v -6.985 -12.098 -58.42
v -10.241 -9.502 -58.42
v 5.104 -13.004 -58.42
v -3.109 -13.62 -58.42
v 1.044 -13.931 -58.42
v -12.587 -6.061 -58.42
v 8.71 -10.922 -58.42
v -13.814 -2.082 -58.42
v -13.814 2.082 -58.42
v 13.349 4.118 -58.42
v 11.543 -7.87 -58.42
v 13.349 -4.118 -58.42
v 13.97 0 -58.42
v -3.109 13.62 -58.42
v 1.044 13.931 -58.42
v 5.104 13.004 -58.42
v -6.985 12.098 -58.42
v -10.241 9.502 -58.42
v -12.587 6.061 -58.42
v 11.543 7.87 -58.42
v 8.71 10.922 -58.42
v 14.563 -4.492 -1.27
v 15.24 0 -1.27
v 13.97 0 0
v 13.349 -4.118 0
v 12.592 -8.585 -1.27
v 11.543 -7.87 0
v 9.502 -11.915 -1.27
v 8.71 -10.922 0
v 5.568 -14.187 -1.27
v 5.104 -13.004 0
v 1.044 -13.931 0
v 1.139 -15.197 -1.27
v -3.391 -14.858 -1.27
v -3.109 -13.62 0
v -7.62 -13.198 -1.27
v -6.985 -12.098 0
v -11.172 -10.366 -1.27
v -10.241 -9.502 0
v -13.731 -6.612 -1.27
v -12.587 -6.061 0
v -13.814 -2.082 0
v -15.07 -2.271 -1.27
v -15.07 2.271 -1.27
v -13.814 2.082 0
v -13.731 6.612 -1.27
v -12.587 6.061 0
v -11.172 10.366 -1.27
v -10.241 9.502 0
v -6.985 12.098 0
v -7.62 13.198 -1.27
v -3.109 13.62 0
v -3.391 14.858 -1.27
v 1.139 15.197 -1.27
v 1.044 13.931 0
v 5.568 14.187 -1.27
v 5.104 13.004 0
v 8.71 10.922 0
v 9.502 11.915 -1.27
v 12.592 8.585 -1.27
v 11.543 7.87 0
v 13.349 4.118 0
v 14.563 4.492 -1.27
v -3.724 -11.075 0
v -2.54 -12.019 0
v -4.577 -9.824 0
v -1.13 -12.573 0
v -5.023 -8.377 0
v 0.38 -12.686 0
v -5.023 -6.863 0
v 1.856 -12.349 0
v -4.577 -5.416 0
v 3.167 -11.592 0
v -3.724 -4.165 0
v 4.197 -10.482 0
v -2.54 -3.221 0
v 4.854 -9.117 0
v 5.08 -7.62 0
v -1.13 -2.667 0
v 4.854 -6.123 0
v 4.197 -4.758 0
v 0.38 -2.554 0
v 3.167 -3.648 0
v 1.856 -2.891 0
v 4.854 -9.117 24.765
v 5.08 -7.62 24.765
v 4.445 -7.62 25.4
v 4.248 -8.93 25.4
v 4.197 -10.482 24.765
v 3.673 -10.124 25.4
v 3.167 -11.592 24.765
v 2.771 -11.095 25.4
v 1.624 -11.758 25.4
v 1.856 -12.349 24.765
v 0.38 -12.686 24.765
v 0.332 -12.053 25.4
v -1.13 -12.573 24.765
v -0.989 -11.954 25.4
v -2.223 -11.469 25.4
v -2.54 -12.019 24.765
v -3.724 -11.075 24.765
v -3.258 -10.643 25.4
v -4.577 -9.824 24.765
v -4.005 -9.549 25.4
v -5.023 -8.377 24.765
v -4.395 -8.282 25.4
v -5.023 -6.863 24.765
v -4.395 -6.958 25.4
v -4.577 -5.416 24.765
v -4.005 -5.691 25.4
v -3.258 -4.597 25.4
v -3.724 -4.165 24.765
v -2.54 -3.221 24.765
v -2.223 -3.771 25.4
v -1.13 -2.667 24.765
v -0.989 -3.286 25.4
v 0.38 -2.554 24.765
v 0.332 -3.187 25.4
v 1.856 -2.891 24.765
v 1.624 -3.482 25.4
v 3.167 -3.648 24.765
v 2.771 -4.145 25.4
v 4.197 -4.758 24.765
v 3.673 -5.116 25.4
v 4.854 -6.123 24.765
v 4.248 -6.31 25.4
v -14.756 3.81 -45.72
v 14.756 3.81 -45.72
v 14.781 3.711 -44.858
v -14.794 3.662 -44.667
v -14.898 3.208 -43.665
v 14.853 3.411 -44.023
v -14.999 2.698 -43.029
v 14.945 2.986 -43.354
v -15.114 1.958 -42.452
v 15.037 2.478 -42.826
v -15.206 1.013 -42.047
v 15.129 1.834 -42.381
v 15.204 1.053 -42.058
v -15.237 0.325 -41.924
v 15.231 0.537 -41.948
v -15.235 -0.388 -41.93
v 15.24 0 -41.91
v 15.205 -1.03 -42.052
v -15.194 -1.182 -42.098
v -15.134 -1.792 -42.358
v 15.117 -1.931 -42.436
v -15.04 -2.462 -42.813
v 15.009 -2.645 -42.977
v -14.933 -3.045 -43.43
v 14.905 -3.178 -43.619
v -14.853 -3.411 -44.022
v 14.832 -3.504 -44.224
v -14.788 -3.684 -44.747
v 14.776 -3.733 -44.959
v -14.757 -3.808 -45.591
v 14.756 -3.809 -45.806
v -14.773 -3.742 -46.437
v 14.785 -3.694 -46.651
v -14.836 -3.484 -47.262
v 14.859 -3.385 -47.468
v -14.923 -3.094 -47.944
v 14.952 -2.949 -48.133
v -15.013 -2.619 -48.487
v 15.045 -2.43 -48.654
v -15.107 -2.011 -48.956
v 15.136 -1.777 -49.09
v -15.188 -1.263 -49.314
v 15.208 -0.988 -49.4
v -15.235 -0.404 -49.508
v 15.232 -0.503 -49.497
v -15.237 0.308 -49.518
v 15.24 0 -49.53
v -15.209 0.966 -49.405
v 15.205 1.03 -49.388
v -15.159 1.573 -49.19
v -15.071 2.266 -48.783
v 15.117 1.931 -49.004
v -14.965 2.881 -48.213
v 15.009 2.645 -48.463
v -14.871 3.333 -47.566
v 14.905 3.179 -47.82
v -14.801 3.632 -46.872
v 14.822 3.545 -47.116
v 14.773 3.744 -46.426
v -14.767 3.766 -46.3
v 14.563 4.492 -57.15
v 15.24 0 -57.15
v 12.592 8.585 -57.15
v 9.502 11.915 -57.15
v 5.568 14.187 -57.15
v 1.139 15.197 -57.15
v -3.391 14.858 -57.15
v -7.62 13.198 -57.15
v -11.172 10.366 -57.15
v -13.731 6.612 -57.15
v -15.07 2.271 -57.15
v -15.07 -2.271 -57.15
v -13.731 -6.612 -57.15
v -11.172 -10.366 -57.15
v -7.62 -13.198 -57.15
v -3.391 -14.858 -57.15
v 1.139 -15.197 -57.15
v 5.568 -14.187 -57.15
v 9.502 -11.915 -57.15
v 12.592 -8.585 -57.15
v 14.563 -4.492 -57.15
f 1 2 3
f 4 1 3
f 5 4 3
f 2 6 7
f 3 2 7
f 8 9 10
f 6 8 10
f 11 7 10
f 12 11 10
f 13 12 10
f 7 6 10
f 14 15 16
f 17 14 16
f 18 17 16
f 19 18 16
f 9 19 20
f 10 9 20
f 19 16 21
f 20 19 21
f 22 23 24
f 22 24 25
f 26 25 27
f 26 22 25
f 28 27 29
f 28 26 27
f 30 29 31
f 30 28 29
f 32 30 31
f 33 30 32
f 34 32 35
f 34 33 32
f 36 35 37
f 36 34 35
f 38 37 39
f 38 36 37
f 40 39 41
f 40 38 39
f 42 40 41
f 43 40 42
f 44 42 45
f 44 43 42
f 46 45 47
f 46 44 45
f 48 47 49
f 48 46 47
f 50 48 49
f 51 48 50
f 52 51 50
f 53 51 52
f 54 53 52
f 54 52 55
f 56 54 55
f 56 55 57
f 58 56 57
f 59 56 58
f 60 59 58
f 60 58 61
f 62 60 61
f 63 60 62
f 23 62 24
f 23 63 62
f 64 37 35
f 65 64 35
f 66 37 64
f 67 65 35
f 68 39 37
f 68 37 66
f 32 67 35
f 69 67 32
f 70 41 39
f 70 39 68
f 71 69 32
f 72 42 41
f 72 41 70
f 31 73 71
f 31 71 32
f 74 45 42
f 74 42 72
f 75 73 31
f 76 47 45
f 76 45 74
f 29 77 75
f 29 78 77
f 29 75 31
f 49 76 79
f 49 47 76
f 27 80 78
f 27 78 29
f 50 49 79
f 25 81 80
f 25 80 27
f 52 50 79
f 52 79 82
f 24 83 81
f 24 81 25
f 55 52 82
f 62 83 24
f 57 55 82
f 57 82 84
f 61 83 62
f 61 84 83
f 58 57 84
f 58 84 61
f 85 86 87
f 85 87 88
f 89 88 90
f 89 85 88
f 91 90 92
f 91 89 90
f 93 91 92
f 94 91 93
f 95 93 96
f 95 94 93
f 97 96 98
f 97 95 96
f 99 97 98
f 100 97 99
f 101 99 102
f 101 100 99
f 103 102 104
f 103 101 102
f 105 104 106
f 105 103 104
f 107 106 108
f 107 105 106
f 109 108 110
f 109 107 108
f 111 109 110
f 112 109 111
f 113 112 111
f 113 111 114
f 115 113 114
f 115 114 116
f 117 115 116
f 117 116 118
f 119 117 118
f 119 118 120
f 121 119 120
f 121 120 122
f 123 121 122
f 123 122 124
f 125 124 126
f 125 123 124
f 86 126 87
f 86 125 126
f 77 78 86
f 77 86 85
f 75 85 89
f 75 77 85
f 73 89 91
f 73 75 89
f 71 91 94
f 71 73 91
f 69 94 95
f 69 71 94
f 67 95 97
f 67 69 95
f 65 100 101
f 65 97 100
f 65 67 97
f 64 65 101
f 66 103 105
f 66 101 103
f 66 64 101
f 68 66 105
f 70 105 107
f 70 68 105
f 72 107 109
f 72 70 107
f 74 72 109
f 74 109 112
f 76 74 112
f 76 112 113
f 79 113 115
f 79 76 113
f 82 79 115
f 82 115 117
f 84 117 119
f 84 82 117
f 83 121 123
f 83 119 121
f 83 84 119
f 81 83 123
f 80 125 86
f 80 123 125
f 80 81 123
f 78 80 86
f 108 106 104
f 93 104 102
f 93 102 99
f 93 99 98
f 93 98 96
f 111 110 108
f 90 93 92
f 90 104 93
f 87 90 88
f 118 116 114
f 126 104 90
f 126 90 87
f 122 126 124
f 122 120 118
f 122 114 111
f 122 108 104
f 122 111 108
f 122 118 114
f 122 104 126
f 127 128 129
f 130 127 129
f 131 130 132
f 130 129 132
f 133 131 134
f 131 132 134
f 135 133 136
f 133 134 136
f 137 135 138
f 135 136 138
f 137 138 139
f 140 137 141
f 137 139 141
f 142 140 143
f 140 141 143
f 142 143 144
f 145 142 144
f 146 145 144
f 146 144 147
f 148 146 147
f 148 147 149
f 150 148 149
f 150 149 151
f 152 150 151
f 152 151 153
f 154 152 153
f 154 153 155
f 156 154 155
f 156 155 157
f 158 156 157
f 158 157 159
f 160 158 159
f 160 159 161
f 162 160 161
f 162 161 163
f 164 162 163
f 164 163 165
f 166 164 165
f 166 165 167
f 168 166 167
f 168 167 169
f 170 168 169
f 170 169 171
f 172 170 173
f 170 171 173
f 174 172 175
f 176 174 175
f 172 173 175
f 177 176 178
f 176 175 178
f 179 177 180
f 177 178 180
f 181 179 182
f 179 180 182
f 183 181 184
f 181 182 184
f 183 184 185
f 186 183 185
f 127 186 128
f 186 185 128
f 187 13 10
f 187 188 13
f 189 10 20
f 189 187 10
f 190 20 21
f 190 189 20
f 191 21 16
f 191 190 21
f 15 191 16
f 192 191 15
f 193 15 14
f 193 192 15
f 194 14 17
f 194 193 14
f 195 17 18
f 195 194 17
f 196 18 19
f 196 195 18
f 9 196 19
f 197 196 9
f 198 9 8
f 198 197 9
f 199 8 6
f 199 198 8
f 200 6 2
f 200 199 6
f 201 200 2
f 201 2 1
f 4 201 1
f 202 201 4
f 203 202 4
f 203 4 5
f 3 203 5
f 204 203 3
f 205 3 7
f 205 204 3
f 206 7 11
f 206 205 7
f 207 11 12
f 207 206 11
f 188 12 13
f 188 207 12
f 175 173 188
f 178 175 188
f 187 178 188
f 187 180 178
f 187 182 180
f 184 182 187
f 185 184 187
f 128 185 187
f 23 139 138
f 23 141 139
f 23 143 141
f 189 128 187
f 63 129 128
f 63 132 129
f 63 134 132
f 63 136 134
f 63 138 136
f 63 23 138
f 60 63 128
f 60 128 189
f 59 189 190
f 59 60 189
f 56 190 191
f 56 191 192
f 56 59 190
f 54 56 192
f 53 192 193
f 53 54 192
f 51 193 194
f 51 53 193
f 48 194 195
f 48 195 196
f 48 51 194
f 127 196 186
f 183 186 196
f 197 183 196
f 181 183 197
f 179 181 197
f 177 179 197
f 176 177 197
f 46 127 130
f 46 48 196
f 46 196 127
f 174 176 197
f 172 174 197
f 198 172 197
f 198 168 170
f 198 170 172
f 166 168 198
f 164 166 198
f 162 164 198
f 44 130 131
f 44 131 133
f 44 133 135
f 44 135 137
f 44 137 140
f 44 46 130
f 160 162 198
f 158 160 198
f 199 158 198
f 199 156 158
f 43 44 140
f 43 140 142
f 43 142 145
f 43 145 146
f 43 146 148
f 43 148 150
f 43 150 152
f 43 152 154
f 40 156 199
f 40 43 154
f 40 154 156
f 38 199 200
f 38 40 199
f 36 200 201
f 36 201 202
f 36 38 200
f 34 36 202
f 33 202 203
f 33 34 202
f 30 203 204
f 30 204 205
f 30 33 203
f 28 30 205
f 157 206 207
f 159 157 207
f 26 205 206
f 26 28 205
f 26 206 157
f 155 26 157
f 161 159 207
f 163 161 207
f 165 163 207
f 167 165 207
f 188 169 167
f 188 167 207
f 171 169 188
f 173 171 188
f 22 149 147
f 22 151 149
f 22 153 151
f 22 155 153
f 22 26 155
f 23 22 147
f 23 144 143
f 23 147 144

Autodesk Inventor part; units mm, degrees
ref_plane "YZ Plane" through (0, 0, 0) normal (1, 0, 0) x (0, 1, 0)
ref_plane "XZ Plane" through (0, 0, 0) normal (0, 1, 0) x (-1, 0, 0)
ref_plane "XY Plane" through (0, 0, 0) normal (0, 0, 1) x (1, 0, 0)
sketch "Sketch1" plane through (0, 0, 0) normal (0, 0, 1) x (1, 0, 0)
  circle A0 centre (0, 0) radius 15.24
  circle A1 centre (0, -7.62) radius 5.08
  dimension "d0" = 30.48
  dimension "d1" = 10.16
  dimension "d2" = 7.62
extrude "Extrusion1" add sketch "Sketch1" against normal blind 58.42 contours A0 | A1
extrude "Extrusion2" add sketch "Sketch1" along normal blind 25.4 contours A1
sketch "Sketch2" plane through (0, 0, 0) normal (1, 0, 0) x (0, 1, 0)
  line L0 (15.24, 0) -> (15.24, -58.42) projected
  line L1 (15.24, -58.42) -> (-15.24, -58.42) projected
  line L2 (-15.24, -58.42) -> (-15.24, 0) projected
  line L3 (-15.24, 0) -> (-12.7, 0) projected
  line L4 (-12.7, 0) -> (-12.7, 25.4) projected
  line L5 (-12.7, 25.4) -> (-2.54, 25.4) projected
  line L6 (-2.54, 25.4) -> (-2.54, 0) projected
  line L7 (-2.54, 0) -> (15.24, 0) projected
  line L8 (-15.24, -58.42) -> (15.24, -58.42) projected
  line L9 (15.24, 0) -> (-15.24, 0) projected
  circle A0 centre (0, -45.72) radius 3.81
  point P0 (0, 0)
  dimension "d7" = 7.62
  dimension "d8" = 12.7
extrude "Extrusion3" cut sketch "Sketch2" against normal through all both and the other way through all contours A0
chamfer "Chamfer1" distance 0.635 angle 45 1 edges at (-5.08, -7.62, 25.4) measured on face at (5.0635, -8.0288, 16.9333)
chamfer "Chamfer2" distance 1.27 angle 45 2 edges at (-15.24, 0, -58.42) (-15.24, 0, 0) measured on face at (9.6385, 11.805, -38.9467)
equation "\"BendRadius\" = Thickness"
equation "\"BendReliefWidth\" = Thickness"
equation "\"BendReliefDepth\" = 0.5 * Thickness"
equation "\"CornerReliefSize\" = 4 * Thickness"
equation "\"MinimumRemnant\" = 2 * Thickness"
equation "\"TransitionRadius\" = BendRadius"
equation "\"JacobiRadiusSize\" = BendRadius"
equation "\"GapSize\" = Thickness"
equation "\"Thickness\" = 3.048"
properties part number "crankshaft valve crank" material "Stainless Steel"
